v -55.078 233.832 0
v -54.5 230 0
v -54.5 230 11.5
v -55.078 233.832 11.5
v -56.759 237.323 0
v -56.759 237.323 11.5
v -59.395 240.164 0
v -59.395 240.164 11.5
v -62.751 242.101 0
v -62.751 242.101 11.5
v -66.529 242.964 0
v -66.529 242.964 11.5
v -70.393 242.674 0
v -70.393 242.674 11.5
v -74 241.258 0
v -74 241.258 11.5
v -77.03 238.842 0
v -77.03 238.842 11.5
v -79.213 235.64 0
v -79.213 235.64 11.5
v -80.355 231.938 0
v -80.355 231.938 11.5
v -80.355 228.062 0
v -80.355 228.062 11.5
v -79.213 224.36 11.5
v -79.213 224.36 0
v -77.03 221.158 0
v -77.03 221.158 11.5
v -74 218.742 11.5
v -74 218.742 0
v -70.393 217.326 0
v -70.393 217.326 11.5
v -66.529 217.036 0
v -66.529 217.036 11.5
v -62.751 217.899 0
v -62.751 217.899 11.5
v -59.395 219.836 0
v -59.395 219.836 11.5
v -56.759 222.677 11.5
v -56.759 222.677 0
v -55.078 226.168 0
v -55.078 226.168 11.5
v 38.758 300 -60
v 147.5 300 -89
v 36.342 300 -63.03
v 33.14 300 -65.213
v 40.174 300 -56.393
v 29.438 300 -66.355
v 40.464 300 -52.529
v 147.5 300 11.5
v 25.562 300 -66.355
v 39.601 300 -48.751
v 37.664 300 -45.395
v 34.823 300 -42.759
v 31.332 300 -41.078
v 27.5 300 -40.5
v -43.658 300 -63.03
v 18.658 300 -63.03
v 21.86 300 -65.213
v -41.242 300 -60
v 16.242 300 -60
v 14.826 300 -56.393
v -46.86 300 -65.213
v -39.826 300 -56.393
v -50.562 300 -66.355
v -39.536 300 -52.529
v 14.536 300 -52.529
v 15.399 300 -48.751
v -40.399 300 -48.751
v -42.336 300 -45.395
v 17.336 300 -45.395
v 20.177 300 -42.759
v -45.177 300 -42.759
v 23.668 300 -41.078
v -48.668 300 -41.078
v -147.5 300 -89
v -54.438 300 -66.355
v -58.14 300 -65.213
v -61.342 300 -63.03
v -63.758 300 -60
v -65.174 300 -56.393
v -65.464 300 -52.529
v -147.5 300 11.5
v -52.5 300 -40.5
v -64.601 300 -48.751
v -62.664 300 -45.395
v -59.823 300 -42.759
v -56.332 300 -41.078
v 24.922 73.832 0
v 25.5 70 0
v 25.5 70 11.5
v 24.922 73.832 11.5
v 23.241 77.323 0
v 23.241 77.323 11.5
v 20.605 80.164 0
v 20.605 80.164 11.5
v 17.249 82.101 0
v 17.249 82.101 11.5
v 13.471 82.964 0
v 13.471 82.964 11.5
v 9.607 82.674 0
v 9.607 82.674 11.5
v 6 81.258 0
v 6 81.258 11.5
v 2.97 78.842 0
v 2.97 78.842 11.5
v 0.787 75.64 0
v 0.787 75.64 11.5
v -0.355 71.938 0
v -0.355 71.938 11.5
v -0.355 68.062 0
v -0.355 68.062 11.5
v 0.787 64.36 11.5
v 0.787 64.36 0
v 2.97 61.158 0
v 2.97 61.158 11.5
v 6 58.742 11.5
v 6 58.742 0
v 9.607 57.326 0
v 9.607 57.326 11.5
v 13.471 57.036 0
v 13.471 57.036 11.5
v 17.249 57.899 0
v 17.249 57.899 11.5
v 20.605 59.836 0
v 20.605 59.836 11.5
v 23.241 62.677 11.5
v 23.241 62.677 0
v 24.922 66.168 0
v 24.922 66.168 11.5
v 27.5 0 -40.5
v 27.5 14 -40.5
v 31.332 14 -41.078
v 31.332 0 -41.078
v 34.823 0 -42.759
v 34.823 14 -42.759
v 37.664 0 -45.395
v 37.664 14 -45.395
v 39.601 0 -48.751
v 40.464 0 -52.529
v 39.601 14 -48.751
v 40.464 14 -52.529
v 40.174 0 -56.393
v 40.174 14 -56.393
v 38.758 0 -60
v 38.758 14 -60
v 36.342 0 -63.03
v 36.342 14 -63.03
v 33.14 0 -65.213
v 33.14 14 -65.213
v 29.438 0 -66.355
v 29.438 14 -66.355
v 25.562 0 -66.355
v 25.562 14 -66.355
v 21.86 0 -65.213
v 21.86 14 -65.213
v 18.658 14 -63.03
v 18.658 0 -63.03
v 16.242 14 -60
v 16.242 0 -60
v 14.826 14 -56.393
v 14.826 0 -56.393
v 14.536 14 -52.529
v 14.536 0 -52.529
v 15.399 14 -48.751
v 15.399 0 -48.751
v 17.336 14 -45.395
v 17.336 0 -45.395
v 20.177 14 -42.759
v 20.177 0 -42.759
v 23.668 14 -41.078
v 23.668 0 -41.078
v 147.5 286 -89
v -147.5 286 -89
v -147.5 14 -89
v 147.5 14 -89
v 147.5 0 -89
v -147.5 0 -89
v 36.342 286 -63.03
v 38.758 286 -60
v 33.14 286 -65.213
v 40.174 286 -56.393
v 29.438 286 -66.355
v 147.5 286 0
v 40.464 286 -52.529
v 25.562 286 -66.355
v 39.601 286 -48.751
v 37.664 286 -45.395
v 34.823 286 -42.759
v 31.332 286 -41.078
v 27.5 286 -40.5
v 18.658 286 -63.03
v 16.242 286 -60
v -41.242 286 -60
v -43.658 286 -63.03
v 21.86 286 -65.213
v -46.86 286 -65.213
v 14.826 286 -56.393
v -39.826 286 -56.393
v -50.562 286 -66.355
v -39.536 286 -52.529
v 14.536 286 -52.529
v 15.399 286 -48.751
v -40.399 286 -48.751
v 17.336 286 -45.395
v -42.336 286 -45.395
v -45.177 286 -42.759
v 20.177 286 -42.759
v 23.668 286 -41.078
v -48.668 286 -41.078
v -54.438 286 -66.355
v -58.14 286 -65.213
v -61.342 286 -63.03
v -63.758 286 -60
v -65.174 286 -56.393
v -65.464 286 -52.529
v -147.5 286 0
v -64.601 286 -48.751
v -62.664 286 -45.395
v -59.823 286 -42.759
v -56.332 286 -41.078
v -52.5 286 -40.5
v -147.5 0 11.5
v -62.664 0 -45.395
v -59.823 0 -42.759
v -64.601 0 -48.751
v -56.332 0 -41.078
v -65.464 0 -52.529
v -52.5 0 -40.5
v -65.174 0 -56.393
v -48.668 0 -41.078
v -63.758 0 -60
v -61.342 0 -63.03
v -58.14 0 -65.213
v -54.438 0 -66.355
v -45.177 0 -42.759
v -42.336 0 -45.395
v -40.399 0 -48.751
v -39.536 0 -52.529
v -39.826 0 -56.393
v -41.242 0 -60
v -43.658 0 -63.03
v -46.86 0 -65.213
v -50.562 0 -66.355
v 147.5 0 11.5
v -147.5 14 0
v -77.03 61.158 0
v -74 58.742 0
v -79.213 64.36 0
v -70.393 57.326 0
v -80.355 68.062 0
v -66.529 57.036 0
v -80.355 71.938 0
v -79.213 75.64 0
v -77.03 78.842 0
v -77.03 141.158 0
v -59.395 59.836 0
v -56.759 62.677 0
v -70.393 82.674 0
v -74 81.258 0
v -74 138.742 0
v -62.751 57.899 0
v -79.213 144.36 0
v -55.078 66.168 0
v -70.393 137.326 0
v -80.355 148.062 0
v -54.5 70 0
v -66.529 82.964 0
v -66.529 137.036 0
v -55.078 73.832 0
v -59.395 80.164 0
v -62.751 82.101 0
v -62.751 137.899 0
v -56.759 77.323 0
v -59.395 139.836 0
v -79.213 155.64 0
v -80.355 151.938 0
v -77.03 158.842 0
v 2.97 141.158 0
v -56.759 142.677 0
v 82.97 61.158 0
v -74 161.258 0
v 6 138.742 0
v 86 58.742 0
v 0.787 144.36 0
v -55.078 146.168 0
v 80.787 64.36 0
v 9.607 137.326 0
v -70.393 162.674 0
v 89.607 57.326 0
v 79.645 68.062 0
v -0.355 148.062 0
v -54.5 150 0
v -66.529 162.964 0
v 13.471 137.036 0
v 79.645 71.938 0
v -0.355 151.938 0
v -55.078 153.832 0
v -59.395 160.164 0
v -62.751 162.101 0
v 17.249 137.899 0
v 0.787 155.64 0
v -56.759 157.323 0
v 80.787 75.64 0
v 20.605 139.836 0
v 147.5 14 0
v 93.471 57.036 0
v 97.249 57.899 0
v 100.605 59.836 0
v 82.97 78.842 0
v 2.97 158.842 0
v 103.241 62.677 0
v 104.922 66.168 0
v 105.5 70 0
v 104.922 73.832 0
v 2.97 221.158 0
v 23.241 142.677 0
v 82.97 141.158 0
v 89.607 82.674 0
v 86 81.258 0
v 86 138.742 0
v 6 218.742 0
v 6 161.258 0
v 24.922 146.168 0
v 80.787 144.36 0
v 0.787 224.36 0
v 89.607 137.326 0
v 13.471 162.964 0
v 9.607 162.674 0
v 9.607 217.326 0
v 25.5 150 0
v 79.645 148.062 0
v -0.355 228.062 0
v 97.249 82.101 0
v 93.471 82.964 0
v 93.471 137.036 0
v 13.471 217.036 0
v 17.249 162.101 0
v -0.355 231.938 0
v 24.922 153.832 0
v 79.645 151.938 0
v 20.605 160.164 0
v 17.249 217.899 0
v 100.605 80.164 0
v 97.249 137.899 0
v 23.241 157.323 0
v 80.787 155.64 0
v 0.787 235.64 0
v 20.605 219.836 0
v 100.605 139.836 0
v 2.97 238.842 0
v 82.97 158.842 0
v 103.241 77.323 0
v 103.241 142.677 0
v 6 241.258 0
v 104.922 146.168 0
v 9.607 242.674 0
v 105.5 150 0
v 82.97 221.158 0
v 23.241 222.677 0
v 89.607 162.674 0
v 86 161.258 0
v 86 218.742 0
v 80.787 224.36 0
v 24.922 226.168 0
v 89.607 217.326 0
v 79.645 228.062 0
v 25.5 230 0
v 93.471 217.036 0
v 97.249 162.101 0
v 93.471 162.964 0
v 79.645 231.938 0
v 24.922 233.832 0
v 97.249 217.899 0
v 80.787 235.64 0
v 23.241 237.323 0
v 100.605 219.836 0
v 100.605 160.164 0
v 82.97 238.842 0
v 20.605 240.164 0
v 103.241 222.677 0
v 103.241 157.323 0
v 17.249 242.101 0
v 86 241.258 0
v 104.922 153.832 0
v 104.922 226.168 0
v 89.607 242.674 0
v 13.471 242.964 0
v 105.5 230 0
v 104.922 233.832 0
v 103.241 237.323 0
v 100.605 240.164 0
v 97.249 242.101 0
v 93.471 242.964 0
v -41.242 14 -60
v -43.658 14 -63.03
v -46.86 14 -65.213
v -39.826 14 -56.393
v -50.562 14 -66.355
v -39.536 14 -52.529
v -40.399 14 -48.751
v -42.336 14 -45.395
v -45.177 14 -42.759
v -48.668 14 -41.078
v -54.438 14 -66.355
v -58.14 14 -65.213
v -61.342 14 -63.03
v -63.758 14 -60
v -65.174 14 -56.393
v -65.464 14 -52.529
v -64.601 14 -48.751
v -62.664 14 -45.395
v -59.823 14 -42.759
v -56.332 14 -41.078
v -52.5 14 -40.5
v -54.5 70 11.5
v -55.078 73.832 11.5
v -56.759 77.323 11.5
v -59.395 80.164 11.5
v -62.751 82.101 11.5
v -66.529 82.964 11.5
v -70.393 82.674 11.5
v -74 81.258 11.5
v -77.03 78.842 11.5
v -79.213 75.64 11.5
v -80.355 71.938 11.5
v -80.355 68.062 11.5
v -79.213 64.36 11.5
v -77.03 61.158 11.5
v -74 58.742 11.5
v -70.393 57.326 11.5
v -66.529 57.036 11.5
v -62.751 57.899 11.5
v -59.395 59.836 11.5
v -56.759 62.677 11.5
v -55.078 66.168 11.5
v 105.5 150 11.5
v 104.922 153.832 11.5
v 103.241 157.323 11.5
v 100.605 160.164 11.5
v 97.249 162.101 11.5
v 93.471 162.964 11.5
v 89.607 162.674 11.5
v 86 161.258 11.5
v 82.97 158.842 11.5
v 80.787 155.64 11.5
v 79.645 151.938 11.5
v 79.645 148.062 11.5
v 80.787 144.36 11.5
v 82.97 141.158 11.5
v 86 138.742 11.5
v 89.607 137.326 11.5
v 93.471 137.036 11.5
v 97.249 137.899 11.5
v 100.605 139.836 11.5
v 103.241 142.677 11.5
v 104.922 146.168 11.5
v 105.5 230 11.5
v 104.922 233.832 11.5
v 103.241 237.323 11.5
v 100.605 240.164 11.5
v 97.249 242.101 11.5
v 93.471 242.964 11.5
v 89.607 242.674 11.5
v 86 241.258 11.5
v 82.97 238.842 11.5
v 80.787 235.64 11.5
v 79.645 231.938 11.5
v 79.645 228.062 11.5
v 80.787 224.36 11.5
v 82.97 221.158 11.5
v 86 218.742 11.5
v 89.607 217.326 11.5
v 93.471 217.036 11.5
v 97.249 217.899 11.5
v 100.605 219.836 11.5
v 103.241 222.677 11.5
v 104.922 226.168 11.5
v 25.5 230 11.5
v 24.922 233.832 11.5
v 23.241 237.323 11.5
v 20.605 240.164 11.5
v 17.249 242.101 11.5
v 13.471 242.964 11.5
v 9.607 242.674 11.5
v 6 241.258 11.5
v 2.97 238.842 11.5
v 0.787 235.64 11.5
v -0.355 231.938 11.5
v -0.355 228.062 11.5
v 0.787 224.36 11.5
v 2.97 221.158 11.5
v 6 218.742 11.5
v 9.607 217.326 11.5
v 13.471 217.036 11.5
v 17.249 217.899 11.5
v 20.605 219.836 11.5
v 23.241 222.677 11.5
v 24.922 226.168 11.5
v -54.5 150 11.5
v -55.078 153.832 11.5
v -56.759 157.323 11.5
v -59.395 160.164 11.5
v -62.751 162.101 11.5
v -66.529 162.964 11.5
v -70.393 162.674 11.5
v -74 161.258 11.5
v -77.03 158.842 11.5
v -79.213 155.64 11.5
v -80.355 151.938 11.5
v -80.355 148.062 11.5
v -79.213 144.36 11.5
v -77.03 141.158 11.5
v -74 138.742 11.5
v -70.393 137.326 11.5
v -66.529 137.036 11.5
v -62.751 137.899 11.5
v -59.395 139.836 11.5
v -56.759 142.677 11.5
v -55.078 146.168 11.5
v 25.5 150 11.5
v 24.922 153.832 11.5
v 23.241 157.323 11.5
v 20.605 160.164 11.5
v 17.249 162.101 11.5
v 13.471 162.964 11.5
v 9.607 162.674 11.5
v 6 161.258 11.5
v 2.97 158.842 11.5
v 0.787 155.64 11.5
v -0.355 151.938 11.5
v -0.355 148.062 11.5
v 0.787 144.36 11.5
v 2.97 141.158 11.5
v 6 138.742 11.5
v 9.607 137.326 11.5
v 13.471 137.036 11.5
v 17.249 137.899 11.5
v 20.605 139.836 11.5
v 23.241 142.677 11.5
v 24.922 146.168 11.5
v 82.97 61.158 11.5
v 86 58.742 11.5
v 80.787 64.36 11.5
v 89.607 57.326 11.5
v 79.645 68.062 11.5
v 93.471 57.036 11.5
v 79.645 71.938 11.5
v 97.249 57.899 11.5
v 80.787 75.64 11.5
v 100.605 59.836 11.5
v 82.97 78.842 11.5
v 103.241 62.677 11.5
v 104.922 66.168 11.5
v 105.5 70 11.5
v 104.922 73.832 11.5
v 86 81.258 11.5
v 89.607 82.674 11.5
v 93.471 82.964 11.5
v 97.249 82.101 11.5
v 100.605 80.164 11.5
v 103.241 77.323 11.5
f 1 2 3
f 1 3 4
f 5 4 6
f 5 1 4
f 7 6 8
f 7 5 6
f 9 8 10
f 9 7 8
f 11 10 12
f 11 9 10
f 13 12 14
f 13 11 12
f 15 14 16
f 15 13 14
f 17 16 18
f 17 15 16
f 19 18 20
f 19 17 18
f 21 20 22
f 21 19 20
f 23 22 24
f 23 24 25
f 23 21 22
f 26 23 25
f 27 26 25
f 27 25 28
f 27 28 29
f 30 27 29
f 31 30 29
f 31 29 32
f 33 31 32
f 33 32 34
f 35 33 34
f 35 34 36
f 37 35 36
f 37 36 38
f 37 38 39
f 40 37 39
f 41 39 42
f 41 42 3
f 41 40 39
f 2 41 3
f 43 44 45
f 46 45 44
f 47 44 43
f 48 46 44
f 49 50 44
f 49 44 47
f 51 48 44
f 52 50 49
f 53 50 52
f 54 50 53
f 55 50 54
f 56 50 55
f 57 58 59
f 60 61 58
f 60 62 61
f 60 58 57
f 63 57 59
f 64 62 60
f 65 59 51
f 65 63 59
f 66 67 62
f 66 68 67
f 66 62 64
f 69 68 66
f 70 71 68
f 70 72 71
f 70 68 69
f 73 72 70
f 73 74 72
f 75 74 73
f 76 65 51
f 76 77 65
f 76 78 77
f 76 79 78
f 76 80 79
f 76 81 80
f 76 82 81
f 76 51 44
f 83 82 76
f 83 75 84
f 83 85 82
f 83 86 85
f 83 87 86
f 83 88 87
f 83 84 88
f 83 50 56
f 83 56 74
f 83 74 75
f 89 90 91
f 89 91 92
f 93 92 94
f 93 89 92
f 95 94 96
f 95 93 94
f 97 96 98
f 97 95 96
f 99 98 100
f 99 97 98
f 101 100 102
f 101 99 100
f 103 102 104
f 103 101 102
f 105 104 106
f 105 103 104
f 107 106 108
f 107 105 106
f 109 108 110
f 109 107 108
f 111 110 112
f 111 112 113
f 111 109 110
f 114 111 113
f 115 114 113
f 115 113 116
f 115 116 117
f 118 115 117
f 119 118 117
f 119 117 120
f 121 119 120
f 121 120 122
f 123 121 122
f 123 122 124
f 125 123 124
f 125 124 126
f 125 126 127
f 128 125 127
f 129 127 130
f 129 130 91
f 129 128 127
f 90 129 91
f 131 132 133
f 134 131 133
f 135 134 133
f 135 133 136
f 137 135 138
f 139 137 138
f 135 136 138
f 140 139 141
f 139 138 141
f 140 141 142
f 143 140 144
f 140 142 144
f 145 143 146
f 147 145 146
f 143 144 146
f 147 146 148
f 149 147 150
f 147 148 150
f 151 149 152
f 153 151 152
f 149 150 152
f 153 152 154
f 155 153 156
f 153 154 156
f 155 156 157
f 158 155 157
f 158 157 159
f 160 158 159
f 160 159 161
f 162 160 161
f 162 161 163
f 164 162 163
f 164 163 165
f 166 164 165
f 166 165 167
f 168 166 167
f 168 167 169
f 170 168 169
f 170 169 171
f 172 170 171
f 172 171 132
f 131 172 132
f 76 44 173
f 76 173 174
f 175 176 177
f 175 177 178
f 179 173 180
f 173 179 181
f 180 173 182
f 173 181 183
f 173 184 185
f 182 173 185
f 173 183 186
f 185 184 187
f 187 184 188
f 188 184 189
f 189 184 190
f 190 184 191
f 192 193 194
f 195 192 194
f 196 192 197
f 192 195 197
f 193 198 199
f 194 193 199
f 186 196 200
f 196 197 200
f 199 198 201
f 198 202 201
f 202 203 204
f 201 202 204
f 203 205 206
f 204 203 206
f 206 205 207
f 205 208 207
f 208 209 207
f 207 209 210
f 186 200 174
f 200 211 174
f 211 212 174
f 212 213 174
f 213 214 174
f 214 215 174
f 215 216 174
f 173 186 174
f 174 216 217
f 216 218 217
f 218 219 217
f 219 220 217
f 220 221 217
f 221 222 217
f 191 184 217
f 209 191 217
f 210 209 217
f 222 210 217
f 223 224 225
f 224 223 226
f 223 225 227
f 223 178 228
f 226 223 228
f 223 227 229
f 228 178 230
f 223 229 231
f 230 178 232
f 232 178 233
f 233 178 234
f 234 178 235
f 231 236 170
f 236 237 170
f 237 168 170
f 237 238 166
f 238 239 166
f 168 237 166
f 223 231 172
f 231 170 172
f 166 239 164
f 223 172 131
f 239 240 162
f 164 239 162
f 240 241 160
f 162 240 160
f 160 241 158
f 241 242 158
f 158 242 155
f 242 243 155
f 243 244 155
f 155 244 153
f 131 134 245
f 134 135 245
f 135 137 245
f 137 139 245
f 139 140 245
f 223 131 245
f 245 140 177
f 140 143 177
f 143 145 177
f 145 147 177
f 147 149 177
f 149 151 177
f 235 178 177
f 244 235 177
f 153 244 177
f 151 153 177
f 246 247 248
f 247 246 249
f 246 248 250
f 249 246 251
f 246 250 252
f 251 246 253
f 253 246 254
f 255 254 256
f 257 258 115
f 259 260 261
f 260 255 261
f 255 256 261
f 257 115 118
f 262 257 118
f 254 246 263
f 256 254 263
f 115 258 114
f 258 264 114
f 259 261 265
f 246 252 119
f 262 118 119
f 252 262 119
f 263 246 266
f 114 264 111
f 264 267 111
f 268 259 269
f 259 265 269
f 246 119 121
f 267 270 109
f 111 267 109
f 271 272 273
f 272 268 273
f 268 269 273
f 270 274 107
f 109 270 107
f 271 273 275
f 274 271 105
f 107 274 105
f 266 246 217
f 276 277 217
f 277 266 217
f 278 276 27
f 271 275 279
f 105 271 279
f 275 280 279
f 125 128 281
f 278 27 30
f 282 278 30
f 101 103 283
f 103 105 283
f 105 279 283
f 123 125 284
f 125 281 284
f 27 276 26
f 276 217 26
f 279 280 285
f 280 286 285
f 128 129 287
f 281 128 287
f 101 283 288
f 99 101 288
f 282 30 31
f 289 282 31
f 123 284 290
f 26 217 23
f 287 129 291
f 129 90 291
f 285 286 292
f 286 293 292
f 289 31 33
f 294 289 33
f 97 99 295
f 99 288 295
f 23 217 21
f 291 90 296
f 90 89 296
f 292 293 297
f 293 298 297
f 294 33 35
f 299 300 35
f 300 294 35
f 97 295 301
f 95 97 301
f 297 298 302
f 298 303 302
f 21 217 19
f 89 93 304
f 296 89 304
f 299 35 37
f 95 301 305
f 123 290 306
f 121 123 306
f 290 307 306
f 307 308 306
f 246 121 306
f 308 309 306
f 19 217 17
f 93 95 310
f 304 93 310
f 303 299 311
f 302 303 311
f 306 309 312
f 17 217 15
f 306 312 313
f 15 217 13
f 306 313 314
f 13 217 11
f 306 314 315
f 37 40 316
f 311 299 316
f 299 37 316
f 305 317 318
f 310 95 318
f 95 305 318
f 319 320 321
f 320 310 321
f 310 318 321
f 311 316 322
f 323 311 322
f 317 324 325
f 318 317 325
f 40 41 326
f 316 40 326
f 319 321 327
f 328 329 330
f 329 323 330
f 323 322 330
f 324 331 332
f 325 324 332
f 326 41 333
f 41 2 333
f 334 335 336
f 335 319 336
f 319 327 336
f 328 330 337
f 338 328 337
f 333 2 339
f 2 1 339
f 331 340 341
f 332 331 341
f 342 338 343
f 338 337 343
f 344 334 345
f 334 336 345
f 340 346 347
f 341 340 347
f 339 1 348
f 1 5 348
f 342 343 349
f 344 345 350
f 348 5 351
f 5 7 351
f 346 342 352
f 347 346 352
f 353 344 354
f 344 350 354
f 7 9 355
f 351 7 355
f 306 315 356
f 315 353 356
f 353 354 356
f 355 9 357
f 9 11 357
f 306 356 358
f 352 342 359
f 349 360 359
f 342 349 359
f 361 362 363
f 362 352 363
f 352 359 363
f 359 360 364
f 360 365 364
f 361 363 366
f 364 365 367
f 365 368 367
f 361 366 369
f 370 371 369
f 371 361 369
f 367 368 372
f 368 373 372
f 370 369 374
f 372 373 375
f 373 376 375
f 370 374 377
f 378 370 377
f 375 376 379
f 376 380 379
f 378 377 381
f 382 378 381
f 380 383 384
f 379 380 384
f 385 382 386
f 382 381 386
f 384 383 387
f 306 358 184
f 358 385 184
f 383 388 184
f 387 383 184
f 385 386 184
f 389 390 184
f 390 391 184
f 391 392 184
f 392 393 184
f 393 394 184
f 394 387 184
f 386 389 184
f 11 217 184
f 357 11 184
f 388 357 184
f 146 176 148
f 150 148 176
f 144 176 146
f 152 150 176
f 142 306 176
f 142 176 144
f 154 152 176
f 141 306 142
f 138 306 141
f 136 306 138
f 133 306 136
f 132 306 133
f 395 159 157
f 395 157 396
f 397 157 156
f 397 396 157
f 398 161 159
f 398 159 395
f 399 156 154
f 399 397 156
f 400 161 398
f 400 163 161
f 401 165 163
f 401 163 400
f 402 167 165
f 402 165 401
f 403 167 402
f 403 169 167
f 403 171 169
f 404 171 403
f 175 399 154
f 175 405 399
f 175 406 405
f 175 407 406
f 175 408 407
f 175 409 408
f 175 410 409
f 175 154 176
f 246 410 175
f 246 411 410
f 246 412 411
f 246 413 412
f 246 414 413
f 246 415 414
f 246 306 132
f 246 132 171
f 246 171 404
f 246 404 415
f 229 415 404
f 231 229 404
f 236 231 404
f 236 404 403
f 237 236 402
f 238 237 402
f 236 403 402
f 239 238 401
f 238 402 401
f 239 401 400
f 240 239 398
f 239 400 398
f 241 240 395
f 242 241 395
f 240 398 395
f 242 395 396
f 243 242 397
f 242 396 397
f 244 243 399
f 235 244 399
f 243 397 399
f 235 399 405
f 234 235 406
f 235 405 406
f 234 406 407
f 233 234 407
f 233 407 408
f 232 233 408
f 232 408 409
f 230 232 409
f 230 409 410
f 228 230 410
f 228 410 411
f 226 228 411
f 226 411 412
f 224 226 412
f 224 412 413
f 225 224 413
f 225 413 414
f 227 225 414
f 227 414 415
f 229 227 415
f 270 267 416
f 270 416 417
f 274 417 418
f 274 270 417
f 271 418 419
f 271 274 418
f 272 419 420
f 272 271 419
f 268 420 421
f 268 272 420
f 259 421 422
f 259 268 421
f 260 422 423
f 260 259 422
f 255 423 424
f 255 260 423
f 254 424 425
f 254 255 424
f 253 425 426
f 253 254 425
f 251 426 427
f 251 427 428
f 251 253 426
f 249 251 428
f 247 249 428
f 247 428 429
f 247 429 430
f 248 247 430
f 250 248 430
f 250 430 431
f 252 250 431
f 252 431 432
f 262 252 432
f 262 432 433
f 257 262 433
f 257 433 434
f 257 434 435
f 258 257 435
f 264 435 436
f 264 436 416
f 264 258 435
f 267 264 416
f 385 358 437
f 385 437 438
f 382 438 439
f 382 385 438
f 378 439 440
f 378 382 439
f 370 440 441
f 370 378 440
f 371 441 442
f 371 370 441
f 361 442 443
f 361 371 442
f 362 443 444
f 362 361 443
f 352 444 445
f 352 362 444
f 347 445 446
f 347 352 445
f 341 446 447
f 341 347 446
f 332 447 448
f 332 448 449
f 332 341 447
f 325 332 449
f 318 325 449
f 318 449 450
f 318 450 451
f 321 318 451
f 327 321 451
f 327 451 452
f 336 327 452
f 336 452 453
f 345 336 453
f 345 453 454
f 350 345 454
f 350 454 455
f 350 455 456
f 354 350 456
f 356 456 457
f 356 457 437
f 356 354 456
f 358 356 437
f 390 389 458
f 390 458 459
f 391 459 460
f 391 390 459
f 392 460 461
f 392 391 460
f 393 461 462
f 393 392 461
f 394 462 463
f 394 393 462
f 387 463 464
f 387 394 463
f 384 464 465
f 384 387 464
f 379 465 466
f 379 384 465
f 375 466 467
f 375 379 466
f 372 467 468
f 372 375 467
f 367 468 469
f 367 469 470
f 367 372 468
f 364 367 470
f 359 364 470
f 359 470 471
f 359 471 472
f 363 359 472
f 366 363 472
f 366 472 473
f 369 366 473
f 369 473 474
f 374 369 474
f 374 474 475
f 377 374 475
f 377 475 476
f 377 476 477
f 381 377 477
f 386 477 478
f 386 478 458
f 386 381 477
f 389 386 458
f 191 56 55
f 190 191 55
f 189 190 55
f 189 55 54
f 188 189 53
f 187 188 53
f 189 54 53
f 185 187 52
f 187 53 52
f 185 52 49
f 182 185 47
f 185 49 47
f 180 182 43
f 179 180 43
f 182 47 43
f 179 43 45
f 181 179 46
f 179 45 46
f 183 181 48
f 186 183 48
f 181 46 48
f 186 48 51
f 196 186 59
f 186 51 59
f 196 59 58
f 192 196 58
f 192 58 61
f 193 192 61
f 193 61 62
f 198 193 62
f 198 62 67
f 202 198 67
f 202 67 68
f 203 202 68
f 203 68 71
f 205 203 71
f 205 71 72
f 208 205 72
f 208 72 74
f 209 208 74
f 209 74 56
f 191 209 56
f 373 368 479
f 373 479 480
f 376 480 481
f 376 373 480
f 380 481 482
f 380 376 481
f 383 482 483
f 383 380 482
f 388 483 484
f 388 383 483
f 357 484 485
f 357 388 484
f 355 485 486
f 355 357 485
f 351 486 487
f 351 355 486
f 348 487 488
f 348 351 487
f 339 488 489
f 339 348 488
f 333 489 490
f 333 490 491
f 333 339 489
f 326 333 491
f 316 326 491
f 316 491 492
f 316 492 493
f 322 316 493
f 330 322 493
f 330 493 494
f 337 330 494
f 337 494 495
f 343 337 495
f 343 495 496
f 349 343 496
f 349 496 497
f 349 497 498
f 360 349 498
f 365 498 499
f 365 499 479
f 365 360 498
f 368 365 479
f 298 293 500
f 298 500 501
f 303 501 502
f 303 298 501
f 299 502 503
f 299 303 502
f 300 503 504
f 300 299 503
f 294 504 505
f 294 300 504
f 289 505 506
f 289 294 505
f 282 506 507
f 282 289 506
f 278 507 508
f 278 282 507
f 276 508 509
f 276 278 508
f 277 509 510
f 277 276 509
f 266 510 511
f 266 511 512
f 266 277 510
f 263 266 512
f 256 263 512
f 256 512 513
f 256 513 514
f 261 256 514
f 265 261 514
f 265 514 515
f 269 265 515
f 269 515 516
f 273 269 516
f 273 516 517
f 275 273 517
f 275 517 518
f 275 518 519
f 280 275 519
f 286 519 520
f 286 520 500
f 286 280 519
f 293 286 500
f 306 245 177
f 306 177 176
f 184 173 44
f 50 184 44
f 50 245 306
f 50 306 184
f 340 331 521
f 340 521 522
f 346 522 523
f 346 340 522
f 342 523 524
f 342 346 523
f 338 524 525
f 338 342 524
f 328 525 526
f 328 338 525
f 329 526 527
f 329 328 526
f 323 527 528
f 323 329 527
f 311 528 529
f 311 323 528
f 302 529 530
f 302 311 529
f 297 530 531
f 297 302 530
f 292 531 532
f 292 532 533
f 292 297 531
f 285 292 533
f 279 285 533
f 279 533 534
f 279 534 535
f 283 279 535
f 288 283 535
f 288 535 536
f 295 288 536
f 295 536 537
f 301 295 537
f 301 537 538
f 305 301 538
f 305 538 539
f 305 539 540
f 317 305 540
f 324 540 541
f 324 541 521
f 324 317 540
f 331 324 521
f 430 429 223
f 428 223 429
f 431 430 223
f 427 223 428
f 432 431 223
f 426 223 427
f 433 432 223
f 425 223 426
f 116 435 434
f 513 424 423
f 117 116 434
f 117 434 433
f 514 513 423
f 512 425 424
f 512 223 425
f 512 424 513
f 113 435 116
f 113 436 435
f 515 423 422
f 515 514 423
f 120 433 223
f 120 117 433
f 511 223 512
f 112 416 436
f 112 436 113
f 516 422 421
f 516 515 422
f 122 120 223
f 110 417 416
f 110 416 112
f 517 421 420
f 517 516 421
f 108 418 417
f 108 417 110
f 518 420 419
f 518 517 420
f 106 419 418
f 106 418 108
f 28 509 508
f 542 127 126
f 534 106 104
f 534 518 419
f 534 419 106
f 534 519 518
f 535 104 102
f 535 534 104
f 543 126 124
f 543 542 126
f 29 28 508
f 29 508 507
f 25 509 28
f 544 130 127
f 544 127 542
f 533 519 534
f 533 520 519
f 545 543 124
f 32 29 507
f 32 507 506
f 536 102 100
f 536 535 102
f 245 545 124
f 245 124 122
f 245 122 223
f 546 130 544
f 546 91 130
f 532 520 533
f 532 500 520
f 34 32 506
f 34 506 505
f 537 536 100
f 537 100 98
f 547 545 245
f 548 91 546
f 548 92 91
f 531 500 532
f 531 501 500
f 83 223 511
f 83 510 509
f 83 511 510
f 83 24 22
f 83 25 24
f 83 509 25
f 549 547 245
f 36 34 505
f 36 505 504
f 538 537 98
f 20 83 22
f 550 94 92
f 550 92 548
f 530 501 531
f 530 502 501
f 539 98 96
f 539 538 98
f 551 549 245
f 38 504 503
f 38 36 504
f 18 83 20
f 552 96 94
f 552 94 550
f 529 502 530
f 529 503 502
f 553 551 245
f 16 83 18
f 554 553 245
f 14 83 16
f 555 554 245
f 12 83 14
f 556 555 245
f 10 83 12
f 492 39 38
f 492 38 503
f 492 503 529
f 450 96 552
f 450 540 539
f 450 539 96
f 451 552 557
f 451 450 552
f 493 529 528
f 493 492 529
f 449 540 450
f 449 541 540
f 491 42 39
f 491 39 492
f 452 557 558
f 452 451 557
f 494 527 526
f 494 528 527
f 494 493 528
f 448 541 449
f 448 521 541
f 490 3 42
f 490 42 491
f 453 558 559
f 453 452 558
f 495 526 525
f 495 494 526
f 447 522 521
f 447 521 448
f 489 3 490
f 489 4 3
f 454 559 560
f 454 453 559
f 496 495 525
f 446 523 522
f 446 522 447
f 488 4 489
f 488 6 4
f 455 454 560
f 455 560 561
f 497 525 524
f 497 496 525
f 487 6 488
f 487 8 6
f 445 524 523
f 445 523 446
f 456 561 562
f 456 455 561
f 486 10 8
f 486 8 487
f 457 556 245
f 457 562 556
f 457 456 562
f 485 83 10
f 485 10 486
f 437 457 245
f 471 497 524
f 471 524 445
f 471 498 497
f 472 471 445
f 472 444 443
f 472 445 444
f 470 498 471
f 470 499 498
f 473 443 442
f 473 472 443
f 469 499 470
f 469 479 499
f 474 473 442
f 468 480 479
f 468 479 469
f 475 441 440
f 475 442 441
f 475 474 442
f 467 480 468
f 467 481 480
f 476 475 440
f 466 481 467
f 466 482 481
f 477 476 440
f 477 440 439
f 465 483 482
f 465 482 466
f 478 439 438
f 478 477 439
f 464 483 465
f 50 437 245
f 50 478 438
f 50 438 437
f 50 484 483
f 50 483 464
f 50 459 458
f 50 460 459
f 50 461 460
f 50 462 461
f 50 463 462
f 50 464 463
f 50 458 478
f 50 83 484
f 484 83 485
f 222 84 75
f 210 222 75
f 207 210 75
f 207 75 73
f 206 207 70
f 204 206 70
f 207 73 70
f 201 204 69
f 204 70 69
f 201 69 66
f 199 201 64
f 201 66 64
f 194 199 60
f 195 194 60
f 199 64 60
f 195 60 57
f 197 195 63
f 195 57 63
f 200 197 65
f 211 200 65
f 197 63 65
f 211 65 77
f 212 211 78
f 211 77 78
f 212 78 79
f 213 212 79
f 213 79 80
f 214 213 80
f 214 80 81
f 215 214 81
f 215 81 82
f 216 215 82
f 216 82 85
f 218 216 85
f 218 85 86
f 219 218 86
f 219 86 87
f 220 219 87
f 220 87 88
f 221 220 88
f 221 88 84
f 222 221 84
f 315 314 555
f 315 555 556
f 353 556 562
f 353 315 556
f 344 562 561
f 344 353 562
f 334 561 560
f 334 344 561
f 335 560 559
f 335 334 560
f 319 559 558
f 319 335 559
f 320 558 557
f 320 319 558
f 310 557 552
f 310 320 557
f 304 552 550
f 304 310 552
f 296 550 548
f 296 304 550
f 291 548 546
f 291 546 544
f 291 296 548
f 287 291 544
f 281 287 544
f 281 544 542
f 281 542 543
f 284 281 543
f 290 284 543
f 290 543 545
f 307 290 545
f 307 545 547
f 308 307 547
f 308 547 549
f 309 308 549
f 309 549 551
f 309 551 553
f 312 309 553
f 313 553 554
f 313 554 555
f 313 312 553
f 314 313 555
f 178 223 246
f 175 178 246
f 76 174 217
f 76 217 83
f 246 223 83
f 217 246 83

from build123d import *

# Parameters (mm, degrees)
SKETCH_1_W          = 295
SKETCH_1_H          = 300
SKETCH_1_R          = 13
EXTRUDE_466_DEPTH   = 11.5
SKETCH_2_W          = 295
SKETCH_2_H          = 14
EXTRUDE_1_DEPTH     = 89
SKETCH_3_R          = 13
CUT_EXTRUDE_1_DEPTH = 346.943998358


with BuildPart() as part:
    # 草图1 → Extrude 466 (new body)
    with BuildSketch(Plane.XY):
        with Locations((0, 150)):
            Rectangle(SKETCH_1_W, SKETCH_1_H)
        with Locations((92.5, 230)):
            Circle(SKETCH_1_R, mode=Mode.SUBTRACT)
        with Locations((92.5, 150)):
            Circle(SKETCH_1_R, mode=Mode.SUBTRACT)
        with Locations((92.5, 70)):
            Circle(SKETCH_1_R, mode=Mode.SUBTRACT)
        with Locations((12.5, 230)):
            Circle(SKETCH_1_R, mode=Mode.SUBTRACT)
        with Locations((-67.5, 230)):
            Circle(SKETCH_1_R, mode=Mode.SUBTRACT)
        with Locations((-67.5, 150)):
            Circle(SKETCH_1_R, mode=Mode.SUBTRACT)
        with Locations((-67.5, 70)):
            Circle(SKETCH_1_R, mode=Mode.SUBTRACT)
        with Locations((12.5, 70)):
            Circle(SKETCH_1_R, mode=Mode.SUBTRACT)
        with Locations((12.5, 150)):
            Circle(SKETCH_1_R, mode=Mode.SUBTRACT)
    extrude(amount=EXTRUDE_466_DEPTH)

    # 草图2 → 凸台-拉伸1 (add)
    with BuildSketch(Plane(origin=(0, 0, 0), x_dir=(-1, 0, 0), z_dir=(0, 0, -1))):
        with Locations((0, 293)):
            Rectangle(SKETCH_2_W, SKETCH_2_H)
        with Locations((0, 7)):
            Rectangle(SKETCH_2_W, SKETCH_2_H)
    extrude(amount=EXTRUDE_1_DEPTH)

    # 草图3 → 切除-拉伸1 (cut, through all)
    with BuildSketch(Plane(origin=(0, 300, 0), x_dir=(-1, 0, 0), z_dir=(0, 1, 0))):
        with Locations(Location((-27.5, -53.5, 0), (0, 0, 90))):
            Circle(SKETCH_3_R)
        with Locations(Location((52.5, -53.5, 0), (0, 0, 90))):
            Circle(SKETCH_3_R)
    extrude(amount=-CUT_EXTRUDE_1_DEPTH, mode=Mode.SUBTRACT)


solid = part.part
